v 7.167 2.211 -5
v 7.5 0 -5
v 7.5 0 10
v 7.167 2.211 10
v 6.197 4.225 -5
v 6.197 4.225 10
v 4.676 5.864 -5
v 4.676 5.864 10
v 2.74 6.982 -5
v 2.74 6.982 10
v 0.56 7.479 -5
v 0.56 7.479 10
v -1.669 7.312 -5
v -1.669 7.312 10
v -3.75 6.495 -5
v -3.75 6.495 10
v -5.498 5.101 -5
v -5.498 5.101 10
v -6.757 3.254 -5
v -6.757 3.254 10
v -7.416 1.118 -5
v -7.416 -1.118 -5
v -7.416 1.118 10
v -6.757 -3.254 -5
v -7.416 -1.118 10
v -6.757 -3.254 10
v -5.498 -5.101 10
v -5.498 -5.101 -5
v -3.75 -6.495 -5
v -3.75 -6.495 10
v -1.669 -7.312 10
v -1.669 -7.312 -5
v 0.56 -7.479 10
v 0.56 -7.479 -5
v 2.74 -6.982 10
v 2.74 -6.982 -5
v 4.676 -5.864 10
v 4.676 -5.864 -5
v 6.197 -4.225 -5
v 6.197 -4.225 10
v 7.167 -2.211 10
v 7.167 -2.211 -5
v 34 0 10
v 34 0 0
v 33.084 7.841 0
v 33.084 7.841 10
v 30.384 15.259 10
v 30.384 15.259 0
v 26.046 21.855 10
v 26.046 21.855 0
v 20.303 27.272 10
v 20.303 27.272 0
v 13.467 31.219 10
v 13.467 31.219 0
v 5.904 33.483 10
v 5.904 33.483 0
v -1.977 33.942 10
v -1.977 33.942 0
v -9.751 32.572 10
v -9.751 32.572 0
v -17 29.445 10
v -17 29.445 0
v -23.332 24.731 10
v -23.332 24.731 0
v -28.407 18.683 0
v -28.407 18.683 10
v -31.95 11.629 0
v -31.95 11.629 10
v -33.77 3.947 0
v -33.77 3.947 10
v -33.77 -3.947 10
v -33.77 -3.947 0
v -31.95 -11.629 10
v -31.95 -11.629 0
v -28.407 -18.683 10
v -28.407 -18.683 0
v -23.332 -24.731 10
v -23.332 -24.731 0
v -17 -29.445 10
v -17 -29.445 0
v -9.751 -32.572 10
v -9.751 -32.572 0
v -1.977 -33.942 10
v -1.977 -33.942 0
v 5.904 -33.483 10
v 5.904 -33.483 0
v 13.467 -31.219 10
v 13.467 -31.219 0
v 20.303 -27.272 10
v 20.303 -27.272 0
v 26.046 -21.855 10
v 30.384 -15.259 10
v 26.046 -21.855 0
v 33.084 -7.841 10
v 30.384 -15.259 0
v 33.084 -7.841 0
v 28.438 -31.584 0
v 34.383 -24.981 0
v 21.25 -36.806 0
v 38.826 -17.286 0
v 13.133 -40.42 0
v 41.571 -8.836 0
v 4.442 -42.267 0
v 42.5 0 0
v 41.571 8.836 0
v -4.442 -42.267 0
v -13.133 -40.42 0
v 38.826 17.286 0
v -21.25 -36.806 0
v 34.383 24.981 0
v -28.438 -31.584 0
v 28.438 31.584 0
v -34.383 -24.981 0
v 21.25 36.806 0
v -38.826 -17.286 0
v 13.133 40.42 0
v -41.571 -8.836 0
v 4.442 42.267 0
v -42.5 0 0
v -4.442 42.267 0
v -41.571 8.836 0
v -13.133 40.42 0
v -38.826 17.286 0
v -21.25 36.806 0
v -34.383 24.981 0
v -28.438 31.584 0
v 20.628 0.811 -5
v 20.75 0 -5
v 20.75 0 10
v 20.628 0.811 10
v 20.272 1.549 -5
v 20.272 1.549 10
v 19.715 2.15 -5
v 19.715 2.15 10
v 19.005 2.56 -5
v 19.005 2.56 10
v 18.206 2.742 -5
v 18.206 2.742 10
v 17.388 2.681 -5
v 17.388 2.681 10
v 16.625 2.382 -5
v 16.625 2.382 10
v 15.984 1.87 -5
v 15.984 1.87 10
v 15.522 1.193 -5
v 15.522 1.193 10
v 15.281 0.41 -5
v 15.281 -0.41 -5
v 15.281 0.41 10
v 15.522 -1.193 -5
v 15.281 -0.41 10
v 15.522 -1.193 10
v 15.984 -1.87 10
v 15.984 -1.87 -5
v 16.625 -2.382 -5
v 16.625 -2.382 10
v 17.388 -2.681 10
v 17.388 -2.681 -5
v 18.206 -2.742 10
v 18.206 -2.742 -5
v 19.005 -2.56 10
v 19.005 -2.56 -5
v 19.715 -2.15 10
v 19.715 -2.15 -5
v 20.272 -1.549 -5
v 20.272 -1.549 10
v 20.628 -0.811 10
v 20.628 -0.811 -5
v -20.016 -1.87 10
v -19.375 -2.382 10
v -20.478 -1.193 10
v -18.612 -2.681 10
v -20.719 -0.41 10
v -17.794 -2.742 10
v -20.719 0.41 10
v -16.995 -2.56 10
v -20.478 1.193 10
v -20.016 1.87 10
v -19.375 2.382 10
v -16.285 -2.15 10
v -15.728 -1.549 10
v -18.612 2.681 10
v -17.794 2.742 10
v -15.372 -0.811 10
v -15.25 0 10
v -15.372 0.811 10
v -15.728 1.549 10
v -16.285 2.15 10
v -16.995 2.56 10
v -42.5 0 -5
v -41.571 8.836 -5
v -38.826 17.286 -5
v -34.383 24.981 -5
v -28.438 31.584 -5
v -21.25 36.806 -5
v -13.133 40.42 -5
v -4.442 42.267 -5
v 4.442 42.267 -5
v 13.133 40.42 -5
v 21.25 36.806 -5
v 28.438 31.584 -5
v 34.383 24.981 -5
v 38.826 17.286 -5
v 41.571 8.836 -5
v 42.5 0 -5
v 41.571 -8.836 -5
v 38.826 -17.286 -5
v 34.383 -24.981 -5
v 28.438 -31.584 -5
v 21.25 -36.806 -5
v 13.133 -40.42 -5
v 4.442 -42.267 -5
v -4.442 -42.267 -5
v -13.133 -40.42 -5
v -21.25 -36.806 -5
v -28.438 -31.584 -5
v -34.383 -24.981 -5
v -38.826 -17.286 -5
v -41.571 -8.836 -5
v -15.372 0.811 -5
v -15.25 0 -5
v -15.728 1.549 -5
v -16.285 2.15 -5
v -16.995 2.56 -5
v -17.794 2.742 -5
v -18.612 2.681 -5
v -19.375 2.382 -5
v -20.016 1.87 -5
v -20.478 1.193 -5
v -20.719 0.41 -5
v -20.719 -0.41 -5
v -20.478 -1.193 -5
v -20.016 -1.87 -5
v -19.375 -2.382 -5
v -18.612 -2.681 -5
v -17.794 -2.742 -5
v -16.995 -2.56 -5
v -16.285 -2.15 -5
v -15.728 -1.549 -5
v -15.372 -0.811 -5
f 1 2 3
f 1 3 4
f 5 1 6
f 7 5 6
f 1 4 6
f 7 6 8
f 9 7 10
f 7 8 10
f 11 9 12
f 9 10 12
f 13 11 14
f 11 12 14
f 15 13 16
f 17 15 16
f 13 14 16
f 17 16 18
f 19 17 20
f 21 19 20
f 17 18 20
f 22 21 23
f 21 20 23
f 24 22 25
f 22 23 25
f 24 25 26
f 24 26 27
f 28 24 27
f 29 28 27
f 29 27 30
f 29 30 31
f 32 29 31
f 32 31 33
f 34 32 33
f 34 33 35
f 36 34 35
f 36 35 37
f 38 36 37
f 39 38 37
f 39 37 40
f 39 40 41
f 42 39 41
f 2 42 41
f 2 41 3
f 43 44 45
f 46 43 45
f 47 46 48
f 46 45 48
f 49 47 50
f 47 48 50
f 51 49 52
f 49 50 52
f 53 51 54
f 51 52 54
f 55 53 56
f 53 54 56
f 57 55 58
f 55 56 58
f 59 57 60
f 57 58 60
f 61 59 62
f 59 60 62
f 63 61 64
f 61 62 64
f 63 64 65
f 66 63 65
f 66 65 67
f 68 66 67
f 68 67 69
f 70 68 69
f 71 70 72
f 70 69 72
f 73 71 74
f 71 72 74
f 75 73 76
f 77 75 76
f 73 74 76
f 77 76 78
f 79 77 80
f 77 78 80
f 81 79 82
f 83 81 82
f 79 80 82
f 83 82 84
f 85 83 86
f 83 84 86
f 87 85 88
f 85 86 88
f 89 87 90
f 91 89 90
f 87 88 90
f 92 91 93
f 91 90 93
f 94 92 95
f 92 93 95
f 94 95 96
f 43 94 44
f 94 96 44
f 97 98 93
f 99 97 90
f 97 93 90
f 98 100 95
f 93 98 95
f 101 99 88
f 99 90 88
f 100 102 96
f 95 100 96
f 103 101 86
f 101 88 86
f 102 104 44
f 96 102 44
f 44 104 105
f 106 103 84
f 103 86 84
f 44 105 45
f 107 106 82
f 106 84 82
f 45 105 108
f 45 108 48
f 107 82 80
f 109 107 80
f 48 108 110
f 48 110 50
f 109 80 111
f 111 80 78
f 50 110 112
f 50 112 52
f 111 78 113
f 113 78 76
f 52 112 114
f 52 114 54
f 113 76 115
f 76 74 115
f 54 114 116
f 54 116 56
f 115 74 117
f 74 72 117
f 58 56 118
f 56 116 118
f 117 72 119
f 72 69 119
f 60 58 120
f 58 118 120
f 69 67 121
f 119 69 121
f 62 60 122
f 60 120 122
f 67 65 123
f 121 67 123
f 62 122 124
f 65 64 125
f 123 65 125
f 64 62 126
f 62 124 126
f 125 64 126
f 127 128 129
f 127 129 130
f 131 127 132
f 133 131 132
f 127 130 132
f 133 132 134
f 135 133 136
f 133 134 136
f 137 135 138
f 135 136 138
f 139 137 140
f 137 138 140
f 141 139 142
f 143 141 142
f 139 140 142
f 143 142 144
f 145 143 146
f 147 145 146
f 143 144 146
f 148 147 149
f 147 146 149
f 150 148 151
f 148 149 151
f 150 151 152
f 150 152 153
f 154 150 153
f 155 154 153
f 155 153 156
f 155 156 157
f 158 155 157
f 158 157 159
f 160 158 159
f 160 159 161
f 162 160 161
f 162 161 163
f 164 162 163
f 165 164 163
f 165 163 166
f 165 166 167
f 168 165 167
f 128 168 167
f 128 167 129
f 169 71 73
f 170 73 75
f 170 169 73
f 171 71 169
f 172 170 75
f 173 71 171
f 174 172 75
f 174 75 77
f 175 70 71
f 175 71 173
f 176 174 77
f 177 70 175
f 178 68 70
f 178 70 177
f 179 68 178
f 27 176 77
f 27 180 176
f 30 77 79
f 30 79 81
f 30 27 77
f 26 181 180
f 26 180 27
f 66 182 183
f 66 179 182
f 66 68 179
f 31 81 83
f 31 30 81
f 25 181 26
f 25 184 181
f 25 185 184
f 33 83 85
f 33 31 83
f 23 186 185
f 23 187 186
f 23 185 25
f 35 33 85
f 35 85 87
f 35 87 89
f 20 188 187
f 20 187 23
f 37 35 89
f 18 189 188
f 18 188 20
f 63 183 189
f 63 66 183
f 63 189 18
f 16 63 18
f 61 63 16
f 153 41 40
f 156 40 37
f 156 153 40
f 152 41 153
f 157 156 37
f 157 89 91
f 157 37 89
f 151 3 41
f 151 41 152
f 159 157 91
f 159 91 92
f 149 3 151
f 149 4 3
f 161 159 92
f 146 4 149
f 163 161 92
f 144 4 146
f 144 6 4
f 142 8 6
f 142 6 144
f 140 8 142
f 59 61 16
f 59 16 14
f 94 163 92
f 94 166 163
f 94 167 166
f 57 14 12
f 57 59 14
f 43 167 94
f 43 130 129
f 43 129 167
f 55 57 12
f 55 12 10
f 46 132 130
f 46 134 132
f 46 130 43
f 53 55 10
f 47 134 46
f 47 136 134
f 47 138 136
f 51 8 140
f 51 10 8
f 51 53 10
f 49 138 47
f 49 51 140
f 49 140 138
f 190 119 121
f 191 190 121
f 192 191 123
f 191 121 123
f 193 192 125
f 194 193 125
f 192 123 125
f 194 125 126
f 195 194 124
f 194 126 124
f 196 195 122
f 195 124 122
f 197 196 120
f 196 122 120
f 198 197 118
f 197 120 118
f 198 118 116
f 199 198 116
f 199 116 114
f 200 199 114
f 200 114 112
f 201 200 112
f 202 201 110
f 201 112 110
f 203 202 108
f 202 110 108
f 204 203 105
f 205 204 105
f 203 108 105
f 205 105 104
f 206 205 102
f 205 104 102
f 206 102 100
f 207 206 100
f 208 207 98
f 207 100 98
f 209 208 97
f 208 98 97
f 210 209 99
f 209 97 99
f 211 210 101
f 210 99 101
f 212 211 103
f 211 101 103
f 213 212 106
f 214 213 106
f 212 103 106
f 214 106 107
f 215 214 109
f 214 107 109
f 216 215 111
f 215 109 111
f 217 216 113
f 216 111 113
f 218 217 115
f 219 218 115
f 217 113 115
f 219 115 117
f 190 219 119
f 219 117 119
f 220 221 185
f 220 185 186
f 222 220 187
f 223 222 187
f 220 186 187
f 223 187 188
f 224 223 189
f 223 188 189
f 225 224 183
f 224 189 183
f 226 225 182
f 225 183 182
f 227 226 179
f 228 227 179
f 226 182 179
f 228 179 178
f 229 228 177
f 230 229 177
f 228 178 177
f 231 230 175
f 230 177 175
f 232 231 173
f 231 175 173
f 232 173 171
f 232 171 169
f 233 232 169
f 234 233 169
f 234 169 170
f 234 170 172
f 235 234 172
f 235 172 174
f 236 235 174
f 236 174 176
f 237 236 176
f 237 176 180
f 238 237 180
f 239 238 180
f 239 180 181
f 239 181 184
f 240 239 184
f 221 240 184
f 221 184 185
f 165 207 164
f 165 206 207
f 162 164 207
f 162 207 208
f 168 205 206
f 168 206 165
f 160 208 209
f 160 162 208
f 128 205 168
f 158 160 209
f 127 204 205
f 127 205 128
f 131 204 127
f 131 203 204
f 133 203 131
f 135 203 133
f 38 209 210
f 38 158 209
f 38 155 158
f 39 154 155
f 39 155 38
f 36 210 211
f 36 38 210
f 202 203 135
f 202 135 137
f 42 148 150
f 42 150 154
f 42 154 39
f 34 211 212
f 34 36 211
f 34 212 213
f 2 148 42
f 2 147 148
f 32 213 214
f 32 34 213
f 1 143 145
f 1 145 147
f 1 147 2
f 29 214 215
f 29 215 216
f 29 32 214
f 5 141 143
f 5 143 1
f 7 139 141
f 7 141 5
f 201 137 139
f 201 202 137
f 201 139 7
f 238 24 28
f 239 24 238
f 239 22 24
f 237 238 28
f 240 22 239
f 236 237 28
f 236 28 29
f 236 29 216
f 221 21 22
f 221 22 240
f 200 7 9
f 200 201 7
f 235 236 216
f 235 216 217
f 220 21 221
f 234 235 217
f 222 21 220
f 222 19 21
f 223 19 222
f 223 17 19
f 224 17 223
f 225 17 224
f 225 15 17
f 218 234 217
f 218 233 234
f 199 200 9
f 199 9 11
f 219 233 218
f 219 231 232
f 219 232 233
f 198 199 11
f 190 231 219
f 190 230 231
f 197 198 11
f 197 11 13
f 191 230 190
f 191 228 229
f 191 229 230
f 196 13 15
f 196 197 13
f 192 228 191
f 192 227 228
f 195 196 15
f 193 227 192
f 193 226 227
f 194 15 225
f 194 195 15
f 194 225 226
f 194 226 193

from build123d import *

# Parameters (mm, degrees)
SKIZZE1_R                        = 34
AUFSATZ_LINEAR_AUSTRAGEN1_DEPTH  = 10
SKIZZE3_R                        = 42.5
AUFSATZ_LINEAR_AUSTRAGEN2_DEPTH  = 5
F_15_0_15_DURCHMESSER_BOHRUNG1_D = 15
F_5_5_5_5_DURCHMESSER_BOHRUNG1_D = 5.5


with BuildPart() as part:
    # Skizze1 → Aufsatz-Linear austragen1 (new body)
    with BuildSketch(Plane.XY):
        Circle(SKIZZE1_R)
    extrude(amount=AUFSATZ_LINEAR_AUSTRAGEN1_DEPTH)

    # Skizze3 → Aufsatz-Linear austragen2 (add)
    with BuildSketch(Plane(origin=(0, 0, 0), x_dir=(-1, 0, 0), z_dir=(0, 0, -1))):
        Circle(SKIZZE3_R)
    extrude(amount=AUFSATZ_LINEAR_AUSTRAGEN2_DEPTH)

    # Ø15.0 (15) Durchmesser Bohrung1 (through all)
    with Locations(Plane(origin=(0, 0, -5), x_dir=(-1, 0, 0), z_dir=(0, 0, -1))):
        with Locations((0, 0)):
            Hole(F_15_0_15_DURCHMESSER_BOHRUNG1_D / 2)

    # Ø5.5 (5.5) Durchmesser Bohrung1 (through all)
    with Locations(Plane(origin=(0, 0, -5), x_dir=(-1, 0, 0), z_dir=(0, 0, -1))):
        with Locations((18, 0), (-18, 0)):
            Hole(F_5_5_5_5_DURCHMESSER_BOHRUNG1_D / 2)


solid = part.part
